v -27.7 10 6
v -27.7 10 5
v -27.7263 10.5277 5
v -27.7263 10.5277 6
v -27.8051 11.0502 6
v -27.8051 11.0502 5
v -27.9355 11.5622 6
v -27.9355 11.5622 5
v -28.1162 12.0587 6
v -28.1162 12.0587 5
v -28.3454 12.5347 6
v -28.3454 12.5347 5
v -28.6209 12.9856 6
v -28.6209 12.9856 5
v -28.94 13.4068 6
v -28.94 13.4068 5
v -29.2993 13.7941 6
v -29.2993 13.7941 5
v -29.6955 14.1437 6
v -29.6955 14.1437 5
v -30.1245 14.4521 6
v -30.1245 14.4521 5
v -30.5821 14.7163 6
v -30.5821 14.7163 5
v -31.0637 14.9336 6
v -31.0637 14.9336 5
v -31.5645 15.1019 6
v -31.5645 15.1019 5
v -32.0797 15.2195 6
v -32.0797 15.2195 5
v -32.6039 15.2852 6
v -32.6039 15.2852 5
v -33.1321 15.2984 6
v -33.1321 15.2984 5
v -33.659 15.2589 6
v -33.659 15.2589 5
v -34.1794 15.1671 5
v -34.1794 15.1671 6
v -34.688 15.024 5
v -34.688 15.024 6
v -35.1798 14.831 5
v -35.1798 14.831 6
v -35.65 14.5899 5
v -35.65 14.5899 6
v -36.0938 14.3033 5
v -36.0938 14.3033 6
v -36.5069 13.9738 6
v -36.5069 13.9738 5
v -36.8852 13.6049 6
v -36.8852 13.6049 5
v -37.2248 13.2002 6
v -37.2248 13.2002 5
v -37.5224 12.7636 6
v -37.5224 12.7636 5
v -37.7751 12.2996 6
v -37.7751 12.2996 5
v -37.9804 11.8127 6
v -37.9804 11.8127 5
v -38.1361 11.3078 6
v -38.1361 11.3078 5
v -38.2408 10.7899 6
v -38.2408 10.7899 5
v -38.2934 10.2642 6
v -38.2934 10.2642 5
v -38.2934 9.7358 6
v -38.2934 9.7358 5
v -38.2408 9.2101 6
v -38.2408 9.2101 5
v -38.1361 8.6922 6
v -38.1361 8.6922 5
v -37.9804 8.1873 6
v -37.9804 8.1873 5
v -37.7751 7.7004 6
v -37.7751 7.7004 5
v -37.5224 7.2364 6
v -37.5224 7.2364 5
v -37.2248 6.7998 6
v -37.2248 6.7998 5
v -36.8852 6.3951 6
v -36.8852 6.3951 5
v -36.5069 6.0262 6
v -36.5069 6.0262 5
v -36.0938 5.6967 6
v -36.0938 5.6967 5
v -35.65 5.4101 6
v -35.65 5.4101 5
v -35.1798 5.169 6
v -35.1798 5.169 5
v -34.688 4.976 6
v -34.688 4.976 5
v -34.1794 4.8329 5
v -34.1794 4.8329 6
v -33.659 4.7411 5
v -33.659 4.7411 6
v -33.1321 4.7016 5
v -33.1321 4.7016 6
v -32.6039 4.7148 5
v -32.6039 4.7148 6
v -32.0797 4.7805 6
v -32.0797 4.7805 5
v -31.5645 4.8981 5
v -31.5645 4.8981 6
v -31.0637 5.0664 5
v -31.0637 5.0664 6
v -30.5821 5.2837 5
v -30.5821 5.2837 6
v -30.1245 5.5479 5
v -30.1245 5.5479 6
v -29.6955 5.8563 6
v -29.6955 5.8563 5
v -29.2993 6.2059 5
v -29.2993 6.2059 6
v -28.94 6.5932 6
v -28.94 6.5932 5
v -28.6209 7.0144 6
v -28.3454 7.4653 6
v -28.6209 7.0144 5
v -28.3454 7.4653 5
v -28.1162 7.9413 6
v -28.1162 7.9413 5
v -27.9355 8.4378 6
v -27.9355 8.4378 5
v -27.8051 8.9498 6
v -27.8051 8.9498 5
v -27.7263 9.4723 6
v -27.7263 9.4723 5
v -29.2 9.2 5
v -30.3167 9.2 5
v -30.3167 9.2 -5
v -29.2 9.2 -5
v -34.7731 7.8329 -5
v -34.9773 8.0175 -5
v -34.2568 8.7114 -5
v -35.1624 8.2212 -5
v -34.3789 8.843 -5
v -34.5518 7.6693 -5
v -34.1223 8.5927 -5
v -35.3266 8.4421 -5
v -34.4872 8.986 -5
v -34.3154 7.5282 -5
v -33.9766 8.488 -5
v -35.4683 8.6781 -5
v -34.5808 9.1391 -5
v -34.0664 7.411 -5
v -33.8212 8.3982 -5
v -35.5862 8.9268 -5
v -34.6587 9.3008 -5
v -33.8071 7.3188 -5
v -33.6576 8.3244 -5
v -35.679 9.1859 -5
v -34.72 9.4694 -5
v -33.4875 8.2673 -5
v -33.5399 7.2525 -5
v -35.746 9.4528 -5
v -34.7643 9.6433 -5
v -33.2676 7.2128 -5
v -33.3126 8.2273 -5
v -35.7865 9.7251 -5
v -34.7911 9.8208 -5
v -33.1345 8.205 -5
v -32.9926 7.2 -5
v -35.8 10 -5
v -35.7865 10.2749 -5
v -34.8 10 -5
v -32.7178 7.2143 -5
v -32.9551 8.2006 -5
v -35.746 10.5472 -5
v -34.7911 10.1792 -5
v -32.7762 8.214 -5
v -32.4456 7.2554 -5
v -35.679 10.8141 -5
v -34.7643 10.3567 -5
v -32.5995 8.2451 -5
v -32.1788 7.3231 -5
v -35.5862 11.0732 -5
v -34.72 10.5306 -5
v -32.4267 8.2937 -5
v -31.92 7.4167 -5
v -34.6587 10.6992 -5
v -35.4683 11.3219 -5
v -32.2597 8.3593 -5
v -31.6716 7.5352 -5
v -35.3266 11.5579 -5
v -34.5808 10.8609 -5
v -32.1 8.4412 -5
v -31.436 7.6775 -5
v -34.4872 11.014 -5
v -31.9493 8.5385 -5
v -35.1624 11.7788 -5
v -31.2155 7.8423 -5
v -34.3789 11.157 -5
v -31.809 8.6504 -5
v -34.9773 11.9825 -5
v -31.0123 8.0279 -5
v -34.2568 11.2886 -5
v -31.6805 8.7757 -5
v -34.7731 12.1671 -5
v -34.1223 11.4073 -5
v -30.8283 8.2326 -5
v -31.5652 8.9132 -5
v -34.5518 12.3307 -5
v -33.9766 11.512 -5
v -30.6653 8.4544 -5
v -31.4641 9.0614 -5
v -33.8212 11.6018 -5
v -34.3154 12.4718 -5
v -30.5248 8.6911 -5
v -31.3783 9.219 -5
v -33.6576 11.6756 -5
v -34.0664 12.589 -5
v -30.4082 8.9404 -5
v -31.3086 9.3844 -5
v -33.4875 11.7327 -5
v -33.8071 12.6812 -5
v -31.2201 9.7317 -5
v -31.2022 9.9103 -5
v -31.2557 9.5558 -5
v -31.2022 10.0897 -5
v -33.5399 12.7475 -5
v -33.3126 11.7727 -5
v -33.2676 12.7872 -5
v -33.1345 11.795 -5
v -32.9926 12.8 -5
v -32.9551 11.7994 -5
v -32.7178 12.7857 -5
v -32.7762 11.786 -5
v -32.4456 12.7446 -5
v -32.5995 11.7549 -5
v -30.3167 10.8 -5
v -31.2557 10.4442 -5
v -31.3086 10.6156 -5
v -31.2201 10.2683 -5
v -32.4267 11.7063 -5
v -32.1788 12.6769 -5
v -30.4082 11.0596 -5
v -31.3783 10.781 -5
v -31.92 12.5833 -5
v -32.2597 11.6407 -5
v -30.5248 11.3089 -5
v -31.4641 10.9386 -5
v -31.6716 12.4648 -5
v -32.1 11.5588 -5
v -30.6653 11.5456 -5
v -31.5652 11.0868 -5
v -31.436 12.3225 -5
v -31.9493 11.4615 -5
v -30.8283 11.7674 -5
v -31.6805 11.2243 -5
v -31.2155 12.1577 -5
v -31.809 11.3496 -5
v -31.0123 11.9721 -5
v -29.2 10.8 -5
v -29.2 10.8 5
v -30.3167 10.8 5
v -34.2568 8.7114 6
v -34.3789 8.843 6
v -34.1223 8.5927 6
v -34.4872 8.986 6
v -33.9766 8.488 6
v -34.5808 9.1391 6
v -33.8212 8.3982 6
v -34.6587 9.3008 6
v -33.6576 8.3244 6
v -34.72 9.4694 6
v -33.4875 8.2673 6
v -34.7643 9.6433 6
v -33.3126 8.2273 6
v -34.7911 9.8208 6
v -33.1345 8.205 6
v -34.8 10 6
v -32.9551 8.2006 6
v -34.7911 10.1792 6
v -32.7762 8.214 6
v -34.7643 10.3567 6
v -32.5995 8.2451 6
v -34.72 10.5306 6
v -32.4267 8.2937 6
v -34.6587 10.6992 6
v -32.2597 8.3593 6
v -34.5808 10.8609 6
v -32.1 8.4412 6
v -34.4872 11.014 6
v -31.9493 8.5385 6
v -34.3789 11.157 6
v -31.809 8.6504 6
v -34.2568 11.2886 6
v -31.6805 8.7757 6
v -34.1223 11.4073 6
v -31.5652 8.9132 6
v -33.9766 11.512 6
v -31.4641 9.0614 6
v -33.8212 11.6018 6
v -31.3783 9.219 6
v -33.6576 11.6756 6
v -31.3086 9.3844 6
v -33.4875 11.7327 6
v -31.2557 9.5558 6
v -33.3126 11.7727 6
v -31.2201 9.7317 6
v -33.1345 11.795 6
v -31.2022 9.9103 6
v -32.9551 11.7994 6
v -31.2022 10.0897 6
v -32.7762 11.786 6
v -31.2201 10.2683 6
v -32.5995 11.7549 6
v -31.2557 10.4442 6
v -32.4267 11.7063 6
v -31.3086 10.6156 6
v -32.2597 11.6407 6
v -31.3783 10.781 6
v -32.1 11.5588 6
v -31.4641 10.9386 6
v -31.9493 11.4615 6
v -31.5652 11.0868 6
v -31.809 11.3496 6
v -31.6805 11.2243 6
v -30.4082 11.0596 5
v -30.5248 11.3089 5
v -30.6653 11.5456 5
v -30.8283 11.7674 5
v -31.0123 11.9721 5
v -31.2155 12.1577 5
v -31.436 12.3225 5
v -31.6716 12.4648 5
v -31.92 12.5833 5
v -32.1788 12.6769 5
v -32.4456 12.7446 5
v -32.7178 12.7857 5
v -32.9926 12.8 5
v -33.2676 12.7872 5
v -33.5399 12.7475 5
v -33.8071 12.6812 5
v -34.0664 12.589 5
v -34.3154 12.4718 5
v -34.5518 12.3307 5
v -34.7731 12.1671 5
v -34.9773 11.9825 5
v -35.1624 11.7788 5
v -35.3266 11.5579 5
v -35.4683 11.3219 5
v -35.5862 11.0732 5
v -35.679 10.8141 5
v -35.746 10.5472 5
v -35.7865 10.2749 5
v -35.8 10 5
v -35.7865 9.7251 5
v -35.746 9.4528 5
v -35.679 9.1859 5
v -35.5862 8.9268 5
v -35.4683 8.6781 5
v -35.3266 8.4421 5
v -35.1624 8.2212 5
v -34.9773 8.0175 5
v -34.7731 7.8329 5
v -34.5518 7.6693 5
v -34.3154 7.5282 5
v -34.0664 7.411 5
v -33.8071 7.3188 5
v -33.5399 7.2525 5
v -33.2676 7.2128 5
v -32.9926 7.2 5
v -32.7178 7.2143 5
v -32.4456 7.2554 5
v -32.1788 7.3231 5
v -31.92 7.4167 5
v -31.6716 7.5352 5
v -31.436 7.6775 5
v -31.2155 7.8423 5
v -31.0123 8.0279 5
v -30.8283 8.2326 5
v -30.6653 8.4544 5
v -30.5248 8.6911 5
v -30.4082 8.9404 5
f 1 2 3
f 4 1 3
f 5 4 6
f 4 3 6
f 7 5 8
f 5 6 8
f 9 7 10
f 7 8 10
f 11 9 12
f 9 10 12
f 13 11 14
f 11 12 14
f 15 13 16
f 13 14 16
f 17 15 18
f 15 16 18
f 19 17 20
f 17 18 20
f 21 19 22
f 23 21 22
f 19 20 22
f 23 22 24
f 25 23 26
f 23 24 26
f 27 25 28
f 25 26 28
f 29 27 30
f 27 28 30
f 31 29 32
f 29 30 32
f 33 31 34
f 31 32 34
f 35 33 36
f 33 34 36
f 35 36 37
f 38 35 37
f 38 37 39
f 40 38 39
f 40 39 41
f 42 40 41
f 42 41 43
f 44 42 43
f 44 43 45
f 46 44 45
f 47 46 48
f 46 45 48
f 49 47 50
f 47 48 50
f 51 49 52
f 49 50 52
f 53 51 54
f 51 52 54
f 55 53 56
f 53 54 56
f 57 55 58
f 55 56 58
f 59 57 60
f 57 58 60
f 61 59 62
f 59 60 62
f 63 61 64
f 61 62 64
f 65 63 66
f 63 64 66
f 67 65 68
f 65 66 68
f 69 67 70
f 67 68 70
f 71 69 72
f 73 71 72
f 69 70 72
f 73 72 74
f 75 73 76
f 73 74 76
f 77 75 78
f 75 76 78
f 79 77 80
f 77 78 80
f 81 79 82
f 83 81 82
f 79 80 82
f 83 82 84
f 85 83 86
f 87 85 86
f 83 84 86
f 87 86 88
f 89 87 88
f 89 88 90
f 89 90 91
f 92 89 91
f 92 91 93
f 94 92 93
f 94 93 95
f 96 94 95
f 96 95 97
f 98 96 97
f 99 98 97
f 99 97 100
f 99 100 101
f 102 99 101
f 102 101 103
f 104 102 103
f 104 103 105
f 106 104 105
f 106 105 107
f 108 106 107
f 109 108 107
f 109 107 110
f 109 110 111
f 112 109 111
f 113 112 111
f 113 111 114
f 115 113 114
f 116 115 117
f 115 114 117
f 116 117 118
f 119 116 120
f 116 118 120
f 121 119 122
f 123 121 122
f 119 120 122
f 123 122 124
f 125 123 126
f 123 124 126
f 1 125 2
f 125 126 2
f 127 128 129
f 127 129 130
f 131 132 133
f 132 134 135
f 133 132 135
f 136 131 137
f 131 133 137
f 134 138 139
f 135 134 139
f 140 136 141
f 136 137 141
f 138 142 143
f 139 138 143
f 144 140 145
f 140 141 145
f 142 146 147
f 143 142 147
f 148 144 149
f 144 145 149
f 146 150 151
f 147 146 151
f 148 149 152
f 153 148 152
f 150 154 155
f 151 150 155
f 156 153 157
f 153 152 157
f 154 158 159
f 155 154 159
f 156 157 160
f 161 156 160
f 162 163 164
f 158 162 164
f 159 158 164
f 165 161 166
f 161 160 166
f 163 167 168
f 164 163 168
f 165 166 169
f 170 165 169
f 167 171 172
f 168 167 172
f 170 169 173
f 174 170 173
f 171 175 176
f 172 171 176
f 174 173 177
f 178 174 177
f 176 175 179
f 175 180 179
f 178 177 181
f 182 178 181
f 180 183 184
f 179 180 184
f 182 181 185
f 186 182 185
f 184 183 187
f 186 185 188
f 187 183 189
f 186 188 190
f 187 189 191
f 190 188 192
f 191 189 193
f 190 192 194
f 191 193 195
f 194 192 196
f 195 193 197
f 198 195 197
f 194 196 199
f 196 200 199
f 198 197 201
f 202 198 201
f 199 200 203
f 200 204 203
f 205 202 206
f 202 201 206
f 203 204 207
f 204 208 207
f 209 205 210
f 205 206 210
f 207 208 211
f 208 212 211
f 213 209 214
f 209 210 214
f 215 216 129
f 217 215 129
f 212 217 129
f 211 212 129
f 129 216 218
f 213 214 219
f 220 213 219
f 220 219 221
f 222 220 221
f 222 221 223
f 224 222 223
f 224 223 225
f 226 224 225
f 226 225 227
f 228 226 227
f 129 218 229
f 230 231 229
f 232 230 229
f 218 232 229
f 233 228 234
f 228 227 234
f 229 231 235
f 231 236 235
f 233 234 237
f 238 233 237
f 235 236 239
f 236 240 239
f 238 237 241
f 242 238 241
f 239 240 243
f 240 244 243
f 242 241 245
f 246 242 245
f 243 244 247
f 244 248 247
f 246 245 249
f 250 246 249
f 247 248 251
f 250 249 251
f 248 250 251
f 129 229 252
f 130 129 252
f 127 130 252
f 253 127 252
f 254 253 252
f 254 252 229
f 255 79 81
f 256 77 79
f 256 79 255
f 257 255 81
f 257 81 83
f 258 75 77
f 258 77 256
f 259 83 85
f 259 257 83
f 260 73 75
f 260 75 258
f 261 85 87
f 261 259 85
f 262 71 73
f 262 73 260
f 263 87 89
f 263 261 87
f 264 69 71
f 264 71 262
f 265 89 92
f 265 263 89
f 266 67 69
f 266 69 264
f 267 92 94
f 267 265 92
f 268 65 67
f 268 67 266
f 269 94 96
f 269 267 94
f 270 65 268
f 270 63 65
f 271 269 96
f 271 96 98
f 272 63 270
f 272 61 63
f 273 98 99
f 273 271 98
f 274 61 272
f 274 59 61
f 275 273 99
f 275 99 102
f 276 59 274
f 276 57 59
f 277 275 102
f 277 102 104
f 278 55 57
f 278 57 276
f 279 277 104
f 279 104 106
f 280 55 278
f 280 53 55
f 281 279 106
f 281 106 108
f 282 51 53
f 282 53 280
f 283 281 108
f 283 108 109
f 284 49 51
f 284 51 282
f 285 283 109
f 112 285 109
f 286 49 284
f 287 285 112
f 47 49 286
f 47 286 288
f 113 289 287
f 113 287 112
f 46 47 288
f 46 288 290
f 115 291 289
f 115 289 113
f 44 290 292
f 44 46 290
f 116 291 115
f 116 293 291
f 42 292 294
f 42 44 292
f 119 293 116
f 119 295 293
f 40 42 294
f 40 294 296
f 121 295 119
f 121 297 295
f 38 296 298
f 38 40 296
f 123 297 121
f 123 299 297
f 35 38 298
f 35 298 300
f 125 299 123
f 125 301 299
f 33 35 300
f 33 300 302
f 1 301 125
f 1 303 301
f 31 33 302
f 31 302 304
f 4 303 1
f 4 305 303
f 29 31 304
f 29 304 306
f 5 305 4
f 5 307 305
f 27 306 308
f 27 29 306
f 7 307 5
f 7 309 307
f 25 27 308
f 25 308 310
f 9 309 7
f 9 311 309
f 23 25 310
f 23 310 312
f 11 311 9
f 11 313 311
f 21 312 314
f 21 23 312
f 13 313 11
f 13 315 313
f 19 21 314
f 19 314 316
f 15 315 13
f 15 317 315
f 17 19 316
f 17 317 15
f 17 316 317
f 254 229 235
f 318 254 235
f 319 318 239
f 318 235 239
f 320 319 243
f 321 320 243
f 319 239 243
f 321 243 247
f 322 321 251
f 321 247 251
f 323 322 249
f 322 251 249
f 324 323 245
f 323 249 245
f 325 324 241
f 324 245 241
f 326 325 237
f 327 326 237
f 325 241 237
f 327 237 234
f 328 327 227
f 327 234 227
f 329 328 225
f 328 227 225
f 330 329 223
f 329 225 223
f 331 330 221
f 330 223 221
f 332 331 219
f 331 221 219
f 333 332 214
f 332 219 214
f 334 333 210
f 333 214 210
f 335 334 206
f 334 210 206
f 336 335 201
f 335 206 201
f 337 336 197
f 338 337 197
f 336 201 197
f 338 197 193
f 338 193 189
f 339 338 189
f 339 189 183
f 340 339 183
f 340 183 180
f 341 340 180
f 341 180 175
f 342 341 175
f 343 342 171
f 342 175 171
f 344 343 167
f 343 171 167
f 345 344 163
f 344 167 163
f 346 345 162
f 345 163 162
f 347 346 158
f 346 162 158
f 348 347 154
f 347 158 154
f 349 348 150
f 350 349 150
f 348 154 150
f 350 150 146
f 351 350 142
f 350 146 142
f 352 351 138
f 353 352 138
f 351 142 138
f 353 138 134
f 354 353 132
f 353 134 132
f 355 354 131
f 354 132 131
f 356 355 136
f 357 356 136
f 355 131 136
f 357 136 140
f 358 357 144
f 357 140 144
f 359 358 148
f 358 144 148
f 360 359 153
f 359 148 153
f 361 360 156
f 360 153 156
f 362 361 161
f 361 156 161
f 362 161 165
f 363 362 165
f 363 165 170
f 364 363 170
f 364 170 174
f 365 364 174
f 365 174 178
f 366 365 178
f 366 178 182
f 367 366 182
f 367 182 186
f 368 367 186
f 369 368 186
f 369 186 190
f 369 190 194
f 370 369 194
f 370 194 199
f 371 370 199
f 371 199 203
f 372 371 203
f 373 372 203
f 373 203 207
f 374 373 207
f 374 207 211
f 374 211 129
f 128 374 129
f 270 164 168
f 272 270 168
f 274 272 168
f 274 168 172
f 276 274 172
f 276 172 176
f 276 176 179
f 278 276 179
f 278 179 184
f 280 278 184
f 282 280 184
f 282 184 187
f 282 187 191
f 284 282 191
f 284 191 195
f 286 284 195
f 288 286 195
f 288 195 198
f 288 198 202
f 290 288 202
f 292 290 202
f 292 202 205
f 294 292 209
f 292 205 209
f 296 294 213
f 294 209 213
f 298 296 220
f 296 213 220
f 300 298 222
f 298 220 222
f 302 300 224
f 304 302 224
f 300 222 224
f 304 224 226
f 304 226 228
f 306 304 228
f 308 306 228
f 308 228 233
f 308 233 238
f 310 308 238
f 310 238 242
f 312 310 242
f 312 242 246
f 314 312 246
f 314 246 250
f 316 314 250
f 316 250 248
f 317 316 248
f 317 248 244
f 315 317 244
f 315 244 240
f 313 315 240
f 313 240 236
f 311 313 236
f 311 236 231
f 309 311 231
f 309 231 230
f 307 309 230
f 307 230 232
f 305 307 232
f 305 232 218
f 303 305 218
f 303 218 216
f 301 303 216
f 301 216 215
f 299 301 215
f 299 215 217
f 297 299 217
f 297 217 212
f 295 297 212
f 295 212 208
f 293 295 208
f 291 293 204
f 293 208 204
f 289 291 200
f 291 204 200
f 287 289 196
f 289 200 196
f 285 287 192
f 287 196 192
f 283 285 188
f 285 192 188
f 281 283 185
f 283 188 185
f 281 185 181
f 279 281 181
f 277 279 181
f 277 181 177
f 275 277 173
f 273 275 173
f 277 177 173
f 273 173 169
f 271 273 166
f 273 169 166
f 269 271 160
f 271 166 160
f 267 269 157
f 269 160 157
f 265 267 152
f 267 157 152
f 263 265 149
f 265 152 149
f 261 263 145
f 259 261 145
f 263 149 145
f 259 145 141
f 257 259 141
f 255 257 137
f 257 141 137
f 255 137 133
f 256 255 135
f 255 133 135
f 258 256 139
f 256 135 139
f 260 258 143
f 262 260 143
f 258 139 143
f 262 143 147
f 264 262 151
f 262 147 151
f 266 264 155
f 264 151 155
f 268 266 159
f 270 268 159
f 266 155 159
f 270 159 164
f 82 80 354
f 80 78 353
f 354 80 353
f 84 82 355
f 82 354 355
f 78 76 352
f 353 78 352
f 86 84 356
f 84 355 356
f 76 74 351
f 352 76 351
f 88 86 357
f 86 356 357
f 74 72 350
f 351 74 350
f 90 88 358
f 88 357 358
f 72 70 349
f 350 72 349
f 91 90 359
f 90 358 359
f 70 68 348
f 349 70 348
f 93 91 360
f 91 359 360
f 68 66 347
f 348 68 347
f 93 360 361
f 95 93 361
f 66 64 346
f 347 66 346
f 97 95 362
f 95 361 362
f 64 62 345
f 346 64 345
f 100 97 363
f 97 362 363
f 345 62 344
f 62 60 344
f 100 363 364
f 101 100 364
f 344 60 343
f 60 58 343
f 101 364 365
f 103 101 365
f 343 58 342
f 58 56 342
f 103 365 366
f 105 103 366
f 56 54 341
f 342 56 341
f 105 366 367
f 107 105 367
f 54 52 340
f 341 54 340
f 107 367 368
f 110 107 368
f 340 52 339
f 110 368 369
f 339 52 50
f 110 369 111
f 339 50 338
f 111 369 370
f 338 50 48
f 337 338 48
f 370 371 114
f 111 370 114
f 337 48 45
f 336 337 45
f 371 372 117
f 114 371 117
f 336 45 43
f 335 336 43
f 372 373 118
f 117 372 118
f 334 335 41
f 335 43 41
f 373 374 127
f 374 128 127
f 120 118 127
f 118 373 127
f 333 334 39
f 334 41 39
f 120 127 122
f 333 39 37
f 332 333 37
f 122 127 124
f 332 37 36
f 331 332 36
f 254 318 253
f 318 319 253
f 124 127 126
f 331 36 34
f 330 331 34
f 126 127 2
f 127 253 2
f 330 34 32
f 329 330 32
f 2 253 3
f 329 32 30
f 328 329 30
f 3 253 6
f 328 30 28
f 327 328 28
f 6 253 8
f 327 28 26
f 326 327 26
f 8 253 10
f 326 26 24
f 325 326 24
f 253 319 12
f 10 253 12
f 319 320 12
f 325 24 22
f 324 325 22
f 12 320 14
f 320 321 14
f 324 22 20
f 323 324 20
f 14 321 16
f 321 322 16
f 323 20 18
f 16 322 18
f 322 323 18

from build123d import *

# Parameters (mm, degrees)
BOSS_EXTRUDE1_DEPTH      = 5
BOSS_EXTRUDE1_DEPTH_BACK = 5
SKETCH1_R                = 1.75
SKETCH4_R                = 5.3
SKETCH4_R_2              = 1.75
BOSS_EXTRUDE2_DEPTH      = 1
M3_CLEARANCE_HOLE1_D     = 3.6


with BuildPart() as part:
    # Sketch1 → Boss-Extrude1 (new, two sides: drawn at the far end of the back side and taken through both)
    with BuildSketch(Plane.XY.offset(-BOSS_EXTRUDE1_DEPTH_BACK)):
        with BuildLine():
            Line((-29.2, 10.8), (-30.316718427, 10.8))
            ThreePointArc((-30.316718427, 10.8), (-35.8, 10), (-30.316718427, 9.2))
            Line((-30.316718427, 9.2), (-29.2, 9.2))
            Line((-29.2, 9.2), (-29.2, 10.8))
        make_face()
        with Locations(Location((-33, 10, 0), (0, 0, 180))):
            Circle(SKETCH1_R, mode=Mode.SUBTRACT)
    extrude(amount=BOSS_EXTRUDE1_DEPTH + BOSS_EXTRUDE1_DEPTH_BACK)

    # Sketch4 → Boss-Extrude2 (add)
    with BuildSketch(Plane.XY.offset(5)):
        with Locations((-33, 10)):
            Circle(SKETCH4_R)
        with Locations((-33, 10)):
            Circle(SKETCH4_R_2, mode=Mode.SUBTRACT)
    extrude(amount=BOSS_EXTRUDE2_DEPTH)

    # M3 Clearance Hole1 (through all)
    with Locations(Plane.XY.offset(6)):
        with Locations((-33, 10)):
            Hole(M3_CLEARANCE_HOLE1_D / 2)


solid = part.part
